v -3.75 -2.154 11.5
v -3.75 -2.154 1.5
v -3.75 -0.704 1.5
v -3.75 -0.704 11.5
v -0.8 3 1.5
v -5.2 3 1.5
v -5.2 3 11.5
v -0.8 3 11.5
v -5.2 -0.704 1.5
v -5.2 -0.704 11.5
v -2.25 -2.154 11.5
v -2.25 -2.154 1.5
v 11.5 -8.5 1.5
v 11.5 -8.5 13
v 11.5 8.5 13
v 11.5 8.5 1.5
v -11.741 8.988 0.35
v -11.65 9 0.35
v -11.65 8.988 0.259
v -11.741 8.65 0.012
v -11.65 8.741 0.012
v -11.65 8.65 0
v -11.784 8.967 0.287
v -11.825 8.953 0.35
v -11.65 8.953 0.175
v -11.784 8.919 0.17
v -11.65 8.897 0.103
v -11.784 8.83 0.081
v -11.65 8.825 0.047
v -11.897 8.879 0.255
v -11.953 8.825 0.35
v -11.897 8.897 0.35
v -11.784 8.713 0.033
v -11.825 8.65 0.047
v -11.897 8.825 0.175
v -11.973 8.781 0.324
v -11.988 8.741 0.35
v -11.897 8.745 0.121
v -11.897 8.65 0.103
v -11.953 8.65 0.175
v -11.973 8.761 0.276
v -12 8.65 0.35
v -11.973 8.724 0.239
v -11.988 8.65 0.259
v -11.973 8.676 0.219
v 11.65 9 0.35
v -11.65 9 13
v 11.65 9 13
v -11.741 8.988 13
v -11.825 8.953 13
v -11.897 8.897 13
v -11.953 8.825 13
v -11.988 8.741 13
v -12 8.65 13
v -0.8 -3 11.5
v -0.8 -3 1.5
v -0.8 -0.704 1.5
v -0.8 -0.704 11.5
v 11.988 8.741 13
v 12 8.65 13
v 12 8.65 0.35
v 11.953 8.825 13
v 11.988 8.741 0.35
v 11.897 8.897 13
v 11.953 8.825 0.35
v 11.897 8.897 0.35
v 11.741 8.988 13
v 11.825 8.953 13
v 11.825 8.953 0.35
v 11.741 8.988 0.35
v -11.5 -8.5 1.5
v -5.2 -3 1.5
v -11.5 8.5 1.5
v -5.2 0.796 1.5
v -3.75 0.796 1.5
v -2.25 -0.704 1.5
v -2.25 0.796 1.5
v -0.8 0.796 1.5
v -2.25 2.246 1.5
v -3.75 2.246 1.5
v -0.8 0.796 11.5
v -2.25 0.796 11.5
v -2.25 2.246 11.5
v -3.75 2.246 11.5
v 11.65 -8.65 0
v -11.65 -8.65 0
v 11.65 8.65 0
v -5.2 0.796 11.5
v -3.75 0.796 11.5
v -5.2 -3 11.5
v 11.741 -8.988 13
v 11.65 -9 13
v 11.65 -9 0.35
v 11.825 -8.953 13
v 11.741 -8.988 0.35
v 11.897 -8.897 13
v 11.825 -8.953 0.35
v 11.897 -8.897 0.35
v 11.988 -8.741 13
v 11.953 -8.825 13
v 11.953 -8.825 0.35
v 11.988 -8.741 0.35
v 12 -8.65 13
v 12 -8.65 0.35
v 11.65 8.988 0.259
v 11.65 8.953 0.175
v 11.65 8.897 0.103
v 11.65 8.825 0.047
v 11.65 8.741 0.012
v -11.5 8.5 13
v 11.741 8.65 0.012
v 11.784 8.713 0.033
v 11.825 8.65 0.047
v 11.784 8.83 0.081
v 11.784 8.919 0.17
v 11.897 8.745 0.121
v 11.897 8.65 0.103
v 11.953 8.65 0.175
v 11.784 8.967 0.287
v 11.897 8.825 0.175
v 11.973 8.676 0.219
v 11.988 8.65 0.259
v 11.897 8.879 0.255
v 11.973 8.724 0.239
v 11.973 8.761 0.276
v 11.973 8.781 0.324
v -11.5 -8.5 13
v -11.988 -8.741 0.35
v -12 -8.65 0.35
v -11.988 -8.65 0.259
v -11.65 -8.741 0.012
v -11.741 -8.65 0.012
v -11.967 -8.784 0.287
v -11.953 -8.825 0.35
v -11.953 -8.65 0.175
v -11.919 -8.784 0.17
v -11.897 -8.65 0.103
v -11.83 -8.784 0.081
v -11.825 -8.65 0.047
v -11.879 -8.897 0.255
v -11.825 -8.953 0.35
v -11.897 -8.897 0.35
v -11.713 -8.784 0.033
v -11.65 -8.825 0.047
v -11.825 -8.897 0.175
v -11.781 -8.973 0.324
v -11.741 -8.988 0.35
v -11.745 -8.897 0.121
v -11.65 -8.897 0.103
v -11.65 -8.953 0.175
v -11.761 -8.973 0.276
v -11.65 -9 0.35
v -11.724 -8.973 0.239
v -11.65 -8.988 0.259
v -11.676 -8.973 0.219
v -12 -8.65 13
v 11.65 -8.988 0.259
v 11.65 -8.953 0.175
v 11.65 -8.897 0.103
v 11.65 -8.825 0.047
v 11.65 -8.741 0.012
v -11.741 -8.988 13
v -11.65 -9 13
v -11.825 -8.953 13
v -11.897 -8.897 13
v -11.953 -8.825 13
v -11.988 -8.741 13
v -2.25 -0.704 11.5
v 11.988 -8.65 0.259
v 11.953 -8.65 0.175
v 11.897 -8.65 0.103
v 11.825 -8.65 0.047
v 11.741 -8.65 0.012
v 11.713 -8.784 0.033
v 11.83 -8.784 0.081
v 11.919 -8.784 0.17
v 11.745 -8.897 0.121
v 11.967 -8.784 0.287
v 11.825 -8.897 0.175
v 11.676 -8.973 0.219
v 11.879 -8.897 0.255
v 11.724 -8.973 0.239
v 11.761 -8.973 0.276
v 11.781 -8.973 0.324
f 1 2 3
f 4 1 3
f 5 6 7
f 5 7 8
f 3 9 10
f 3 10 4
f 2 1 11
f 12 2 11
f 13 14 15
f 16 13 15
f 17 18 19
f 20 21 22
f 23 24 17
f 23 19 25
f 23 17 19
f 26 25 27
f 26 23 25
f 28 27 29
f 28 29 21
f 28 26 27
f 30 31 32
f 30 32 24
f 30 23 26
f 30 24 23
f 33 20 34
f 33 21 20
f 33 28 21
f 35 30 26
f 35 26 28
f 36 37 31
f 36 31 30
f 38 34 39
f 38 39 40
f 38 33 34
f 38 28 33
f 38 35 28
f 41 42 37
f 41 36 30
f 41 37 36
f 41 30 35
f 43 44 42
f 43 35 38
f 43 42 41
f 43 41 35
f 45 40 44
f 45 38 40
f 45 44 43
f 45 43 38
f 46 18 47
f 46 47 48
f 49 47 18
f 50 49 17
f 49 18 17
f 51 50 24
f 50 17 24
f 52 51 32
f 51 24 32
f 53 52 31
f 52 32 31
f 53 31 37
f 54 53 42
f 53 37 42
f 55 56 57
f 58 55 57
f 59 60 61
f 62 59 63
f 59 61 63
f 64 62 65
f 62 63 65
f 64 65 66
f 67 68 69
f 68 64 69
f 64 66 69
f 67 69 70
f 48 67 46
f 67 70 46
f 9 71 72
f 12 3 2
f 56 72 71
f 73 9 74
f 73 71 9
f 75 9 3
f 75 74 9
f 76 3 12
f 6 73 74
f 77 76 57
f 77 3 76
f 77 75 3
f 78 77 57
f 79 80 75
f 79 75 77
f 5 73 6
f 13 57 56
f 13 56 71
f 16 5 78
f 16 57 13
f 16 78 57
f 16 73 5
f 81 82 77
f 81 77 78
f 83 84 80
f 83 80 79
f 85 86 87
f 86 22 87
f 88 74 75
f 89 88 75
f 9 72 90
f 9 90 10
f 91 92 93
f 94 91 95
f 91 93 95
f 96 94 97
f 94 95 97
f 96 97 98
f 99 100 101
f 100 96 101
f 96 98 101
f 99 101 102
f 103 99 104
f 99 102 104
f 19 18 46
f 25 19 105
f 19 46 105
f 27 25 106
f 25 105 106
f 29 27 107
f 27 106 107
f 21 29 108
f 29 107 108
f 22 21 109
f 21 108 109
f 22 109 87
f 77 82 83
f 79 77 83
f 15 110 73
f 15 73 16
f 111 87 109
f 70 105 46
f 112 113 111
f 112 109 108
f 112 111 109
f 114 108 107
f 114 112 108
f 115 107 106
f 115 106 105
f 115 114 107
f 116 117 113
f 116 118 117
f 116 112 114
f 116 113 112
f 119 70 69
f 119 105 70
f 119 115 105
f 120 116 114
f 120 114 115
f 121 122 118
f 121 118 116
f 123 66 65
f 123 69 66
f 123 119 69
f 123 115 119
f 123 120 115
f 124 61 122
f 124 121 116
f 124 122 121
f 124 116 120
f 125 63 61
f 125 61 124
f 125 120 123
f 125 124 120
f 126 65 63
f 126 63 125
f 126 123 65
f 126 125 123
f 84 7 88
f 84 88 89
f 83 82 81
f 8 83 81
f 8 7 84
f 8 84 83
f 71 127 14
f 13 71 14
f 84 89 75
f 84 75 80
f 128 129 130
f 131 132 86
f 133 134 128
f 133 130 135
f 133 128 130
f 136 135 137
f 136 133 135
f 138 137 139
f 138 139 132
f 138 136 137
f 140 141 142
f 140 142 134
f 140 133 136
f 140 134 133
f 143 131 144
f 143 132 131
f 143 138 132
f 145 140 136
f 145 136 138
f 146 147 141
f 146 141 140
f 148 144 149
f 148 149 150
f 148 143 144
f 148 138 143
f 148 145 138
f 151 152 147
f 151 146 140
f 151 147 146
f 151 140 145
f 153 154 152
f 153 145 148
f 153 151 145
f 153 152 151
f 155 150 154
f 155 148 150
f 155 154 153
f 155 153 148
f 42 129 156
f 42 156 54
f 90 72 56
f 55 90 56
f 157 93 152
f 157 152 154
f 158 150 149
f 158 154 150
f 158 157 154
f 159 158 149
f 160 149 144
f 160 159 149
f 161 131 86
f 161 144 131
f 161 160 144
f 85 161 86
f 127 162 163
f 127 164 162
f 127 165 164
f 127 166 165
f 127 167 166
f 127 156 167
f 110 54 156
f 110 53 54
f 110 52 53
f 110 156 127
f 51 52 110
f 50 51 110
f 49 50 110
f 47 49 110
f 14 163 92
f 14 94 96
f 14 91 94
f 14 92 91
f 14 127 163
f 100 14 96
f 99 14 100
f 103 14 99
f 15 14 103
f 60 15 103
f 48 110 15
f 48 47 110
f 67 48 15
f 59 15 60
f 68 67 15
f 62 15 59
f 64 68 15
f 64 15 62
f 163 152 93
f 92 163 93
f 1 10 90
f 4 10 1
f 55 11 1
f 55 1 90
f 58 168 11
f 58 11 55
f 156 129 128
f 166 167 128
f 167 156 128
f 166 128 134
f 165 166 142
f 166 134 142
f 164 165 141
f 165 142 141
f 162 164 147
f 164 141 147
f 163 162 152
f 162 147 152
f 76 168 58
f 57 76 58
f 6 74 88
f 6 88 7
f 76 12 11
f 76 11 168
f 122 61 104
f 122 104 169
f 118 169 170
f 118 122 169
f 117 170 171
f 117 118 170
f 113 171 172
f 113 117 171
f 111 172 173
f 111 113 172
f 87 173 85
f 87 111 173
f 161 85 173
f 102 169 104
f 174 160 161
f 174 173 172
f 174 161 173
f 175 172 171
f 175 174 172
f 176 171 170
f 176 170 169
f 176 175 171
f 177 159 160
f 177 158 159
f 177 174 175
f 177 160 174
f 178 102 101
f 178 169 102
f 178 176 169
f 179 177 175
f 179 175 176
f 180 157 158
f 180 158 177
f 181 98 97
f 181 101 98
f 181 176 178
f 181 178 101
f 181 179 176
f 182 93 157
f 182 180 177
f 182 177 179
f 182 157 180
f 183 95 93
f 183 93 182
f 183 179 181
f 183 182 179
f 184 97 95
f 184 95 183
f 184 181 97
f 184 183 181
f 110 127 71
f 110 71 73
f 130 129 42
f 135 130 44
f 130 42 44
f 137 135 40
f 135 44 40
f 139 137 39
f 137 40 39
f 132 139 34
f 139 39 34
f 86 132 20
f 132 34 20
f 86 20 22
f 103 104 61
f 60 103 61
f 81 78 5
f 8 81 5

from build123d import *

# Parameters (mm, degrees)
SKETCH1_W           = 24
SKETCH1_H           = 18
BOSS_EXTRUDE1_DEPTH = 13
FILLET1_R           = 0.35
FILLET2_R           = 0.35
SKETCH2_W           = 23
SKETCH2_H           = 17
CUT_EXTRUDE1_DEPTH  = 11.5
SKETCH11_W          = 4.4
SKETCH11_H          = 6
BOSS_EXTRUDE4_DEPTH = 10
SKETCH12_W          = 4.4
SKETCH12_H          = 1.5
CUT_EXTRUDE6_DEPTH  = 10
SKETCH13_W          = 1.5
SKETCH13_H          = 4.4
CUT_EXTRUDE7_DEPTH  = 10


with BuildPart() as part:
    # Sketch1 → Boss-Extrude1 (new body)
    with BuildSketch(Plane.XY):
        Rectangle(SKETCH1_W, SKETCH1_H)
    extrude(amount=BOSS_EXTRUDE1_DEPTH)

    # Fillet1
    fillet1_edges = [part.edges().sort_by_distance(p)[0] for p in [
        (0, -9, 0),
        (-12, 0, 0),
        (0, 9, 0),
        (12, 0, 0),
    ]]
    fillet(fillet1_edges, radius=FILLET1_R)

    # Fillet2
    # the kernel refuses this fillet: 0.35 mm, written as the material it takes off along each edge
    with BuildSketch(Plane(origin=(11.65, 8.65, 0.35), x_dir=(0, 1, 0), z_dir=(1, 0, 0))) as fillet2_piece_1_section:
        Polygon((0, 0), (FILLET2_R, 0), (FILLET2_R, -FILLET2_R), (0, -FILLET2_R), align=None)
    fillet2_piece_1 = extrude(amount=FILLET2_R, mode=Mode.PRIVATE)
    fillet2_piece_1 = fillet2_piece_1 - Plane(origin=(11.65, 8.65, 0.35), x_dir=(0, -0.7071067811865475, 0.7071067811865475), z_dir=(1, 0, 0)) * Sphere(FILLET2_R, mode=Mode.PRIVATE)
    add(fillet2_piece_1, mode=Mode.SUBTRACT)
    with BuildSketch(Plane(origin=(11.65, -8.65, 0.35), x_dir=(1, 0, 0), z_dir=(0, -1, 0))) as fillet2_piece_2_section:
        Polygon((0, 0), (FILLET2_R, 0), (FILLET2_R, -FILLET2_R), (0, -FILLET2_R), align=None)
    fillet2_piece_2 = extrude(amount=FILLET2_R, mode=Mode.PRIVATE)
    fillet2_piece_2 = fillet2_piece_2 - Plane(origin=(11.65, -8.65, 0.35), x_dir=(-0.7071067811865475, 0, 0.7071067811865475), z_dir=(0, -1, 0)) * Sphere(FILLET2_R, mode=Mode.PRIVATE)
    add(fillet2_piece_2, mode=Mode.SUBTRACT)
    with BuildSketch(Plane(origin=(-11.65, 8.65, 0.35), x_dir=(0, 1, 0), z_dir=(-1, 0, 0))) as fillet2_piece_3_section:
        Polygon((0, 0), (FILLET2_R, 0), (FILLET2_R, FILLET2_R), (0, FILLET2_R), align=None)
    fillet2_piece_3 = extrude(amount=FILLET2_R, mode=Mode.PRIVATE)
    fillet2_piece_3 = fillet2_piece_3 - Plane(origin=(-11.65, 8.65, 0.35), x_dir=(0, -0.7071067811865475, 0.7071067811865475), z_dir=(-1, 0, 0)) * Sphere(FILLET2_R, mode=Mode.PRIVATE)
    add(fillet2_piece_3, mode=Mode.SUBTRACT)
    with BuildSketch(Plane(origin=(-11.65, -8.65, 0.35), x_dir=(-1, 0, 0), z_dir=(0, -1, 0))) as fillet2_piece_4_section:
        Polygon((0, 0), (FILLET2_R, 0), (FILLET2_R, FILLET2_R), (0, FILLET2_R), align=None)
    fillet2_piece_4 = extrude(amount=FILLET2_R, mode=Mode.PRIVATE)
    fillet2_piece_4 = fillet2_piece_4 - Plane(origin=(-11.65, -8.65, 0.35), x_dir=(0.7071067811865475, 0, 0.7071067811865475), z_dir=(0, -1, 0)) * Sphere(FILLET2_R, mode=Mode.PRIVATE)
    add(fillet2_piece_4, mode=Mode.SUBTRACT)
    with BuildSketch(Plane(origin=(12, -9, 0.35), x_dir=(-1, 0, 0), z_dir=(0, 0, 1)), Plane(origin=(12, 9, 0.35), x_dir=(0, -1, 0), z_dir=(0, 0, 1))) as fillet2_piece_5:
        with BuildLine():
            CenterArc((FILLET2_R, -FILLET2_R), FILLET2_R, 90, 90)
            Line((0, -FILLET2_R), (0, 0))
            Line((0, 0), (FILLET2_R, 0))
        make_face()
    extrude(amount=13.525, mode=Mode.SUBTRACT)
    with BuildSketch(Plane(origin=(-12, -9, 0.35), x_dir=(1, 0, 0), z_dir=(0, 0, 1)), Plane(origin=(-12, 9, 0.35), x_dir=(0, -1, 0), z_dir=(0, 0, 1))) as fillet2_piece_6:
        with BuildLine():
            CenterArc((FILLET2_R, FILLET2_R), FILLET2_R, 180, 90)
            Line((0, FILLET2_R), (0, 0))
            Line((0, 0), (FILLET2_R, 0))
        make_face()
    extrude(amount=13.525, mode=Mode.SUBTRACT)

    # Sketch2 → Cut-Extrude1 (cut)
    with BuildSketch(Plane.XY.offset(13)):
        Rectangle(SKETCH2_W, SKETCH2_H)
    extrude(amount=-CUT_EXTRUDE1_DEPTH, mode=Mode.SUBTRACT)

    # Sketch11 → Boss-Extrude4 (add)
    with BuildSketch(Plane.XY.offset(1.5)):
        with Locations((-3, 0)):
            Rectangle(SKETCH11_W, SKETCH11_H)
    extrude(amount=BOSS_EXTRUDE4_DEPTH)

    # Sketch12 → Cut-Extrude6 (cut)
    with BuildSketch(Plane.XY.offset(11.5)):
        with Locations((-3, 0.045549291)):
            Rectangle(SKETCH12_W, SKETCH12_H)
    extrude(amount=-CUT_EXTRUDE6_DEPTH, mode=Mode.SUBTRACT)

    # Sketch13 → Cut-Extrude7 (cut)
    with BuildSketch(Plane.XY.offset(11.5)):
        with Locations((-3, 0.045549291)):
            Rectangle(SKETCH13_W, SKETCH13_H)
    extrude(amount=-CUT_EXTRUDE7_DEPTH, mode=Mode.SUBTRACT)


solid = part.part
